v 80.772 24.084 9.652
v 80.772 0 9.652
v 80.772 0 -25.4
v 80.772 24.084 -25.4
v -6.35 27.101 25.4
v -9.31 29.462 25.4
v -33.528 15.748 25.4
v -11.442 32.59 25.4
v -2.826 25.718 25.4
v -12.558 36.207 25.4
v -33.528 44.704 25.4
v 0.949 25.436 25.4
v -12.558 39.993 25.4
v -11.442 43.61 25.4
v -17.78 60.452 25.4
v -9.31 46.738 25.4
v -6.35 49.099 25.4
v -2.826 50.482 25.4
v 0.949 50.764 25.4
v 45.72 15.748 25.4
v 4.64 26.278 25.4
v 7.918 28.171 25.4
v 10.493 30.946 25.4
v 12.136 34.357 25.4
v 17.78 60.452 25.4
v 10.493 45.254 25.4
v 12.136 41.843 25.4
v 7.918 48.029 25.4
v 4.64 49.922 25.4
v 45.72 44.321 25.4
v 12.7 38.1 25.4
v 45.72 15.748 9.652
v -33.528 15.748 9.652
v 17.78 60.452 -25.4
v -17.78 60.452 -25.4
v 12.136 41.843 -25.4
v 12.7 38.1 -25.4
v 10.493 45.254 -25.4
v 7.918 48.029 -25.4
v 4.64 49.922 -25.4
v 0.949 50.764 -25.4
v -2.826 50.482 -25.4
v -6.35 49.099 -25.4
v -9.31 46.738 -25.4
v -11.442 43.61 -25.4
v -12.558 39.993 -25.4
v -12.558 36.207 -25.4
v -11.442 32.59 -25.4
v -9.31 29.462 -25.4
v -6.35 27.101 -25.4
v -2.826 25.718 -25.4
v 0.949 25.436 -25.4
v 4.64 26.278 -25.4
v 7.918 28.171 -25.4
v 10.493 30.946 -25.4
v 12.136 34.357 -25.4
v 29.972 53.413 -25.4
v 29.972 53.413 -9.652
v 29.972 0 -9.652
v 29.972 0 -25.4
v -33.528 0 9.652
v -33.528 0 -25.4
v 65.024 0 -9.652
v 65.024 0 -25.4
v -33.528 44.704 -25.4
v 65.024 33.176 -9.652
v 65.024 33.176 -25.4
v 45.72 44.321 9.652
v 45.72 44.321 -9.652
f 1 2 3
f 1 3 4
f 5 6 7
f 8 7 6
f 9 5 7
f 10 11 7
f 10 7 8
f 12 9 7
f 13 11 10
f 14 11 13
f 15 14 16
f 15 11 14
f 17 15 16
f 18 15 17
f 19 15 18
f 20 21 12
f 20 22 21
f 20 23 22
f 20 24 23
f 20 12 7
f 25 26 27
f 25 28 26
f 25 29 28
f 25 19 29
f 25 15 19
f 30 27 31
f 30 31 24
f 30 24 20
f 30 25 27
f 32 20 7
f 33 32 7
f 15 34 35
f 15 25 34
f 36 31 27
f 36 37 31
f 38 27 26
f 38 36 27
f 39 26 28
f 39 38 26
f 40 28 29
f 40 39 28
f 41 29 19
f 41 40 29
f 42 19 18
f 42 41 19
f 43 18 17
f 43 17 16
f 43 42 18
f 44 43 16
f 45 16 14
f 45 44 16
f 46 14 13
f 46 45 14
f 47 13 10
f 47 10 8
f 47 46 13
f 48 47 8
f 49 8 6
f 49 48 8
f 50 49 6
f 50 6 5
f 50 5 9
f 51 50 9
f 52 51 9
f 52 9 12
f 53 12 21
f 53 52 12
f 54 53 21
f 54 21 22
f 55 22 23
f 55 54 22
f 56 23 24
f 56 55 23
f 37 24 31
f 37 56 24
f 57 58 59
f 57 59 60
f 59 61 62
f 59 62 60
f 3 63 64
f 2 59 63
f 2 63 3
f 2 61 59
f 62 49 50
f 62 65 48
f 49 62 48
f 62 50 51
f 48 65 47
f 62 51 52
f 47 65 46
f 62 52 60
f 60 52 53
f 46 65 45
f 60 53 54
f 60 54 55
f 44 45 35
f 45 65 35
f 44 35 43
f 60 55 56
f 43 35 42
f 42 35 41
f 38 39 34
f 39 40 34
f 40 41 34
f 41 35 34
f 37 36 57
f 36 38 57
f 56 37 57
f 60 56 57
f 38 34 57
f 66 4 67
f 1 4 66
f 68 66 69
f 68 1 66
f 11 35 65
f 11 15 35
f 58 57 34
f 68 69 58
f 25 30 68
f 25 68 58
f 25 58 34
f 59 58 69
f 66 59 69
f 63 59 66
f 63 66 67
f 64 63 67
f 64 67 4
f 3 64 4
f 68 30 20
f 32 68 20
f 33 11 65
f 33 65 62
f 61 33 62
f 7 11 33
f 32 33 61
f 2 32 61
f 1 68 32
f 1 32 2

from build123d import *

# Parameters (mm, degrees)
SKETCH1_R               = 12.7
BOSS_EXTRUDE1_DEPTH     = 25.4
CUT_EXTRUDE1_START      = 25.4
CUT_EXTRUDE1_DEPTH      = 15.748
SKETCH2_W               = 35.052
SKETCH2_H               = 15.748
CUT_EXTRUDE2_DEPTH      = 61.452
CUT_EXTRUDE2_DEPTH_BACK = 1


with BuildPart() as part:
    # Sketch1 → Boss-Extrude1 (new body, symmetric)
    with BuildSketch(Plane.XY):
        Polygon((-33.528, 44.704), (-33.528, 15.748), (45.72, 15.748), (45.72, 44.320833479), (17.78, 60.452), (-17.78, 60.452), align=None)
        with Locations((0, 38.1)):
            Circle(SKETCH1_R, mode=Mode.SUBTRACT)
        Polygon((-33.528, 15.748), (-33.528, 0), (80.772, 0), (80.772, 24.083551843), (45.72, 44.320833479), (45.72, 15.748), align=None)
    extrude(amount=BOSS_EXTRUDE1_DEPTH, both=True)

    # Sketch1<4> → Cut-Extrude1 (cut)
    with BuildSketch(Plane.XY.offset(CUT_EXTRUDE1_START)):
        Polygon((-33.528, 15.748), (-33.528, 0), (80.772, 0), (80.772, 24.083551843), (45.72, 44.320833479), (45.72, 15.748), align=None)
    extrude(amount=-CUT_EXTRUDE1_DEPTH, mode=Mode.SUBTRACT)

    # Sketch2 → Cut-Extrude2 (cut, two sides)
    with BuildSketch(Plane(origin=(0, 0, 0), x_dir=(1, 0, 0), z_dir=(0, 1, 0))) as cut_extrude2_sk:
        with Locations((47.498, 17.526)):
            Rectangle(SKETCH2_W, SKETCH2_H)
    extrude(amount=CUT_EXTRUDE2_DEPTH, mode=Mode.SUBTRACT)
    extrude(cut_extrude2_sk.sketch, amount=-CUT_EXTRUDE2_DEPTH_BACK, mode=Mode.SUBTRACT)


solid = part.part
